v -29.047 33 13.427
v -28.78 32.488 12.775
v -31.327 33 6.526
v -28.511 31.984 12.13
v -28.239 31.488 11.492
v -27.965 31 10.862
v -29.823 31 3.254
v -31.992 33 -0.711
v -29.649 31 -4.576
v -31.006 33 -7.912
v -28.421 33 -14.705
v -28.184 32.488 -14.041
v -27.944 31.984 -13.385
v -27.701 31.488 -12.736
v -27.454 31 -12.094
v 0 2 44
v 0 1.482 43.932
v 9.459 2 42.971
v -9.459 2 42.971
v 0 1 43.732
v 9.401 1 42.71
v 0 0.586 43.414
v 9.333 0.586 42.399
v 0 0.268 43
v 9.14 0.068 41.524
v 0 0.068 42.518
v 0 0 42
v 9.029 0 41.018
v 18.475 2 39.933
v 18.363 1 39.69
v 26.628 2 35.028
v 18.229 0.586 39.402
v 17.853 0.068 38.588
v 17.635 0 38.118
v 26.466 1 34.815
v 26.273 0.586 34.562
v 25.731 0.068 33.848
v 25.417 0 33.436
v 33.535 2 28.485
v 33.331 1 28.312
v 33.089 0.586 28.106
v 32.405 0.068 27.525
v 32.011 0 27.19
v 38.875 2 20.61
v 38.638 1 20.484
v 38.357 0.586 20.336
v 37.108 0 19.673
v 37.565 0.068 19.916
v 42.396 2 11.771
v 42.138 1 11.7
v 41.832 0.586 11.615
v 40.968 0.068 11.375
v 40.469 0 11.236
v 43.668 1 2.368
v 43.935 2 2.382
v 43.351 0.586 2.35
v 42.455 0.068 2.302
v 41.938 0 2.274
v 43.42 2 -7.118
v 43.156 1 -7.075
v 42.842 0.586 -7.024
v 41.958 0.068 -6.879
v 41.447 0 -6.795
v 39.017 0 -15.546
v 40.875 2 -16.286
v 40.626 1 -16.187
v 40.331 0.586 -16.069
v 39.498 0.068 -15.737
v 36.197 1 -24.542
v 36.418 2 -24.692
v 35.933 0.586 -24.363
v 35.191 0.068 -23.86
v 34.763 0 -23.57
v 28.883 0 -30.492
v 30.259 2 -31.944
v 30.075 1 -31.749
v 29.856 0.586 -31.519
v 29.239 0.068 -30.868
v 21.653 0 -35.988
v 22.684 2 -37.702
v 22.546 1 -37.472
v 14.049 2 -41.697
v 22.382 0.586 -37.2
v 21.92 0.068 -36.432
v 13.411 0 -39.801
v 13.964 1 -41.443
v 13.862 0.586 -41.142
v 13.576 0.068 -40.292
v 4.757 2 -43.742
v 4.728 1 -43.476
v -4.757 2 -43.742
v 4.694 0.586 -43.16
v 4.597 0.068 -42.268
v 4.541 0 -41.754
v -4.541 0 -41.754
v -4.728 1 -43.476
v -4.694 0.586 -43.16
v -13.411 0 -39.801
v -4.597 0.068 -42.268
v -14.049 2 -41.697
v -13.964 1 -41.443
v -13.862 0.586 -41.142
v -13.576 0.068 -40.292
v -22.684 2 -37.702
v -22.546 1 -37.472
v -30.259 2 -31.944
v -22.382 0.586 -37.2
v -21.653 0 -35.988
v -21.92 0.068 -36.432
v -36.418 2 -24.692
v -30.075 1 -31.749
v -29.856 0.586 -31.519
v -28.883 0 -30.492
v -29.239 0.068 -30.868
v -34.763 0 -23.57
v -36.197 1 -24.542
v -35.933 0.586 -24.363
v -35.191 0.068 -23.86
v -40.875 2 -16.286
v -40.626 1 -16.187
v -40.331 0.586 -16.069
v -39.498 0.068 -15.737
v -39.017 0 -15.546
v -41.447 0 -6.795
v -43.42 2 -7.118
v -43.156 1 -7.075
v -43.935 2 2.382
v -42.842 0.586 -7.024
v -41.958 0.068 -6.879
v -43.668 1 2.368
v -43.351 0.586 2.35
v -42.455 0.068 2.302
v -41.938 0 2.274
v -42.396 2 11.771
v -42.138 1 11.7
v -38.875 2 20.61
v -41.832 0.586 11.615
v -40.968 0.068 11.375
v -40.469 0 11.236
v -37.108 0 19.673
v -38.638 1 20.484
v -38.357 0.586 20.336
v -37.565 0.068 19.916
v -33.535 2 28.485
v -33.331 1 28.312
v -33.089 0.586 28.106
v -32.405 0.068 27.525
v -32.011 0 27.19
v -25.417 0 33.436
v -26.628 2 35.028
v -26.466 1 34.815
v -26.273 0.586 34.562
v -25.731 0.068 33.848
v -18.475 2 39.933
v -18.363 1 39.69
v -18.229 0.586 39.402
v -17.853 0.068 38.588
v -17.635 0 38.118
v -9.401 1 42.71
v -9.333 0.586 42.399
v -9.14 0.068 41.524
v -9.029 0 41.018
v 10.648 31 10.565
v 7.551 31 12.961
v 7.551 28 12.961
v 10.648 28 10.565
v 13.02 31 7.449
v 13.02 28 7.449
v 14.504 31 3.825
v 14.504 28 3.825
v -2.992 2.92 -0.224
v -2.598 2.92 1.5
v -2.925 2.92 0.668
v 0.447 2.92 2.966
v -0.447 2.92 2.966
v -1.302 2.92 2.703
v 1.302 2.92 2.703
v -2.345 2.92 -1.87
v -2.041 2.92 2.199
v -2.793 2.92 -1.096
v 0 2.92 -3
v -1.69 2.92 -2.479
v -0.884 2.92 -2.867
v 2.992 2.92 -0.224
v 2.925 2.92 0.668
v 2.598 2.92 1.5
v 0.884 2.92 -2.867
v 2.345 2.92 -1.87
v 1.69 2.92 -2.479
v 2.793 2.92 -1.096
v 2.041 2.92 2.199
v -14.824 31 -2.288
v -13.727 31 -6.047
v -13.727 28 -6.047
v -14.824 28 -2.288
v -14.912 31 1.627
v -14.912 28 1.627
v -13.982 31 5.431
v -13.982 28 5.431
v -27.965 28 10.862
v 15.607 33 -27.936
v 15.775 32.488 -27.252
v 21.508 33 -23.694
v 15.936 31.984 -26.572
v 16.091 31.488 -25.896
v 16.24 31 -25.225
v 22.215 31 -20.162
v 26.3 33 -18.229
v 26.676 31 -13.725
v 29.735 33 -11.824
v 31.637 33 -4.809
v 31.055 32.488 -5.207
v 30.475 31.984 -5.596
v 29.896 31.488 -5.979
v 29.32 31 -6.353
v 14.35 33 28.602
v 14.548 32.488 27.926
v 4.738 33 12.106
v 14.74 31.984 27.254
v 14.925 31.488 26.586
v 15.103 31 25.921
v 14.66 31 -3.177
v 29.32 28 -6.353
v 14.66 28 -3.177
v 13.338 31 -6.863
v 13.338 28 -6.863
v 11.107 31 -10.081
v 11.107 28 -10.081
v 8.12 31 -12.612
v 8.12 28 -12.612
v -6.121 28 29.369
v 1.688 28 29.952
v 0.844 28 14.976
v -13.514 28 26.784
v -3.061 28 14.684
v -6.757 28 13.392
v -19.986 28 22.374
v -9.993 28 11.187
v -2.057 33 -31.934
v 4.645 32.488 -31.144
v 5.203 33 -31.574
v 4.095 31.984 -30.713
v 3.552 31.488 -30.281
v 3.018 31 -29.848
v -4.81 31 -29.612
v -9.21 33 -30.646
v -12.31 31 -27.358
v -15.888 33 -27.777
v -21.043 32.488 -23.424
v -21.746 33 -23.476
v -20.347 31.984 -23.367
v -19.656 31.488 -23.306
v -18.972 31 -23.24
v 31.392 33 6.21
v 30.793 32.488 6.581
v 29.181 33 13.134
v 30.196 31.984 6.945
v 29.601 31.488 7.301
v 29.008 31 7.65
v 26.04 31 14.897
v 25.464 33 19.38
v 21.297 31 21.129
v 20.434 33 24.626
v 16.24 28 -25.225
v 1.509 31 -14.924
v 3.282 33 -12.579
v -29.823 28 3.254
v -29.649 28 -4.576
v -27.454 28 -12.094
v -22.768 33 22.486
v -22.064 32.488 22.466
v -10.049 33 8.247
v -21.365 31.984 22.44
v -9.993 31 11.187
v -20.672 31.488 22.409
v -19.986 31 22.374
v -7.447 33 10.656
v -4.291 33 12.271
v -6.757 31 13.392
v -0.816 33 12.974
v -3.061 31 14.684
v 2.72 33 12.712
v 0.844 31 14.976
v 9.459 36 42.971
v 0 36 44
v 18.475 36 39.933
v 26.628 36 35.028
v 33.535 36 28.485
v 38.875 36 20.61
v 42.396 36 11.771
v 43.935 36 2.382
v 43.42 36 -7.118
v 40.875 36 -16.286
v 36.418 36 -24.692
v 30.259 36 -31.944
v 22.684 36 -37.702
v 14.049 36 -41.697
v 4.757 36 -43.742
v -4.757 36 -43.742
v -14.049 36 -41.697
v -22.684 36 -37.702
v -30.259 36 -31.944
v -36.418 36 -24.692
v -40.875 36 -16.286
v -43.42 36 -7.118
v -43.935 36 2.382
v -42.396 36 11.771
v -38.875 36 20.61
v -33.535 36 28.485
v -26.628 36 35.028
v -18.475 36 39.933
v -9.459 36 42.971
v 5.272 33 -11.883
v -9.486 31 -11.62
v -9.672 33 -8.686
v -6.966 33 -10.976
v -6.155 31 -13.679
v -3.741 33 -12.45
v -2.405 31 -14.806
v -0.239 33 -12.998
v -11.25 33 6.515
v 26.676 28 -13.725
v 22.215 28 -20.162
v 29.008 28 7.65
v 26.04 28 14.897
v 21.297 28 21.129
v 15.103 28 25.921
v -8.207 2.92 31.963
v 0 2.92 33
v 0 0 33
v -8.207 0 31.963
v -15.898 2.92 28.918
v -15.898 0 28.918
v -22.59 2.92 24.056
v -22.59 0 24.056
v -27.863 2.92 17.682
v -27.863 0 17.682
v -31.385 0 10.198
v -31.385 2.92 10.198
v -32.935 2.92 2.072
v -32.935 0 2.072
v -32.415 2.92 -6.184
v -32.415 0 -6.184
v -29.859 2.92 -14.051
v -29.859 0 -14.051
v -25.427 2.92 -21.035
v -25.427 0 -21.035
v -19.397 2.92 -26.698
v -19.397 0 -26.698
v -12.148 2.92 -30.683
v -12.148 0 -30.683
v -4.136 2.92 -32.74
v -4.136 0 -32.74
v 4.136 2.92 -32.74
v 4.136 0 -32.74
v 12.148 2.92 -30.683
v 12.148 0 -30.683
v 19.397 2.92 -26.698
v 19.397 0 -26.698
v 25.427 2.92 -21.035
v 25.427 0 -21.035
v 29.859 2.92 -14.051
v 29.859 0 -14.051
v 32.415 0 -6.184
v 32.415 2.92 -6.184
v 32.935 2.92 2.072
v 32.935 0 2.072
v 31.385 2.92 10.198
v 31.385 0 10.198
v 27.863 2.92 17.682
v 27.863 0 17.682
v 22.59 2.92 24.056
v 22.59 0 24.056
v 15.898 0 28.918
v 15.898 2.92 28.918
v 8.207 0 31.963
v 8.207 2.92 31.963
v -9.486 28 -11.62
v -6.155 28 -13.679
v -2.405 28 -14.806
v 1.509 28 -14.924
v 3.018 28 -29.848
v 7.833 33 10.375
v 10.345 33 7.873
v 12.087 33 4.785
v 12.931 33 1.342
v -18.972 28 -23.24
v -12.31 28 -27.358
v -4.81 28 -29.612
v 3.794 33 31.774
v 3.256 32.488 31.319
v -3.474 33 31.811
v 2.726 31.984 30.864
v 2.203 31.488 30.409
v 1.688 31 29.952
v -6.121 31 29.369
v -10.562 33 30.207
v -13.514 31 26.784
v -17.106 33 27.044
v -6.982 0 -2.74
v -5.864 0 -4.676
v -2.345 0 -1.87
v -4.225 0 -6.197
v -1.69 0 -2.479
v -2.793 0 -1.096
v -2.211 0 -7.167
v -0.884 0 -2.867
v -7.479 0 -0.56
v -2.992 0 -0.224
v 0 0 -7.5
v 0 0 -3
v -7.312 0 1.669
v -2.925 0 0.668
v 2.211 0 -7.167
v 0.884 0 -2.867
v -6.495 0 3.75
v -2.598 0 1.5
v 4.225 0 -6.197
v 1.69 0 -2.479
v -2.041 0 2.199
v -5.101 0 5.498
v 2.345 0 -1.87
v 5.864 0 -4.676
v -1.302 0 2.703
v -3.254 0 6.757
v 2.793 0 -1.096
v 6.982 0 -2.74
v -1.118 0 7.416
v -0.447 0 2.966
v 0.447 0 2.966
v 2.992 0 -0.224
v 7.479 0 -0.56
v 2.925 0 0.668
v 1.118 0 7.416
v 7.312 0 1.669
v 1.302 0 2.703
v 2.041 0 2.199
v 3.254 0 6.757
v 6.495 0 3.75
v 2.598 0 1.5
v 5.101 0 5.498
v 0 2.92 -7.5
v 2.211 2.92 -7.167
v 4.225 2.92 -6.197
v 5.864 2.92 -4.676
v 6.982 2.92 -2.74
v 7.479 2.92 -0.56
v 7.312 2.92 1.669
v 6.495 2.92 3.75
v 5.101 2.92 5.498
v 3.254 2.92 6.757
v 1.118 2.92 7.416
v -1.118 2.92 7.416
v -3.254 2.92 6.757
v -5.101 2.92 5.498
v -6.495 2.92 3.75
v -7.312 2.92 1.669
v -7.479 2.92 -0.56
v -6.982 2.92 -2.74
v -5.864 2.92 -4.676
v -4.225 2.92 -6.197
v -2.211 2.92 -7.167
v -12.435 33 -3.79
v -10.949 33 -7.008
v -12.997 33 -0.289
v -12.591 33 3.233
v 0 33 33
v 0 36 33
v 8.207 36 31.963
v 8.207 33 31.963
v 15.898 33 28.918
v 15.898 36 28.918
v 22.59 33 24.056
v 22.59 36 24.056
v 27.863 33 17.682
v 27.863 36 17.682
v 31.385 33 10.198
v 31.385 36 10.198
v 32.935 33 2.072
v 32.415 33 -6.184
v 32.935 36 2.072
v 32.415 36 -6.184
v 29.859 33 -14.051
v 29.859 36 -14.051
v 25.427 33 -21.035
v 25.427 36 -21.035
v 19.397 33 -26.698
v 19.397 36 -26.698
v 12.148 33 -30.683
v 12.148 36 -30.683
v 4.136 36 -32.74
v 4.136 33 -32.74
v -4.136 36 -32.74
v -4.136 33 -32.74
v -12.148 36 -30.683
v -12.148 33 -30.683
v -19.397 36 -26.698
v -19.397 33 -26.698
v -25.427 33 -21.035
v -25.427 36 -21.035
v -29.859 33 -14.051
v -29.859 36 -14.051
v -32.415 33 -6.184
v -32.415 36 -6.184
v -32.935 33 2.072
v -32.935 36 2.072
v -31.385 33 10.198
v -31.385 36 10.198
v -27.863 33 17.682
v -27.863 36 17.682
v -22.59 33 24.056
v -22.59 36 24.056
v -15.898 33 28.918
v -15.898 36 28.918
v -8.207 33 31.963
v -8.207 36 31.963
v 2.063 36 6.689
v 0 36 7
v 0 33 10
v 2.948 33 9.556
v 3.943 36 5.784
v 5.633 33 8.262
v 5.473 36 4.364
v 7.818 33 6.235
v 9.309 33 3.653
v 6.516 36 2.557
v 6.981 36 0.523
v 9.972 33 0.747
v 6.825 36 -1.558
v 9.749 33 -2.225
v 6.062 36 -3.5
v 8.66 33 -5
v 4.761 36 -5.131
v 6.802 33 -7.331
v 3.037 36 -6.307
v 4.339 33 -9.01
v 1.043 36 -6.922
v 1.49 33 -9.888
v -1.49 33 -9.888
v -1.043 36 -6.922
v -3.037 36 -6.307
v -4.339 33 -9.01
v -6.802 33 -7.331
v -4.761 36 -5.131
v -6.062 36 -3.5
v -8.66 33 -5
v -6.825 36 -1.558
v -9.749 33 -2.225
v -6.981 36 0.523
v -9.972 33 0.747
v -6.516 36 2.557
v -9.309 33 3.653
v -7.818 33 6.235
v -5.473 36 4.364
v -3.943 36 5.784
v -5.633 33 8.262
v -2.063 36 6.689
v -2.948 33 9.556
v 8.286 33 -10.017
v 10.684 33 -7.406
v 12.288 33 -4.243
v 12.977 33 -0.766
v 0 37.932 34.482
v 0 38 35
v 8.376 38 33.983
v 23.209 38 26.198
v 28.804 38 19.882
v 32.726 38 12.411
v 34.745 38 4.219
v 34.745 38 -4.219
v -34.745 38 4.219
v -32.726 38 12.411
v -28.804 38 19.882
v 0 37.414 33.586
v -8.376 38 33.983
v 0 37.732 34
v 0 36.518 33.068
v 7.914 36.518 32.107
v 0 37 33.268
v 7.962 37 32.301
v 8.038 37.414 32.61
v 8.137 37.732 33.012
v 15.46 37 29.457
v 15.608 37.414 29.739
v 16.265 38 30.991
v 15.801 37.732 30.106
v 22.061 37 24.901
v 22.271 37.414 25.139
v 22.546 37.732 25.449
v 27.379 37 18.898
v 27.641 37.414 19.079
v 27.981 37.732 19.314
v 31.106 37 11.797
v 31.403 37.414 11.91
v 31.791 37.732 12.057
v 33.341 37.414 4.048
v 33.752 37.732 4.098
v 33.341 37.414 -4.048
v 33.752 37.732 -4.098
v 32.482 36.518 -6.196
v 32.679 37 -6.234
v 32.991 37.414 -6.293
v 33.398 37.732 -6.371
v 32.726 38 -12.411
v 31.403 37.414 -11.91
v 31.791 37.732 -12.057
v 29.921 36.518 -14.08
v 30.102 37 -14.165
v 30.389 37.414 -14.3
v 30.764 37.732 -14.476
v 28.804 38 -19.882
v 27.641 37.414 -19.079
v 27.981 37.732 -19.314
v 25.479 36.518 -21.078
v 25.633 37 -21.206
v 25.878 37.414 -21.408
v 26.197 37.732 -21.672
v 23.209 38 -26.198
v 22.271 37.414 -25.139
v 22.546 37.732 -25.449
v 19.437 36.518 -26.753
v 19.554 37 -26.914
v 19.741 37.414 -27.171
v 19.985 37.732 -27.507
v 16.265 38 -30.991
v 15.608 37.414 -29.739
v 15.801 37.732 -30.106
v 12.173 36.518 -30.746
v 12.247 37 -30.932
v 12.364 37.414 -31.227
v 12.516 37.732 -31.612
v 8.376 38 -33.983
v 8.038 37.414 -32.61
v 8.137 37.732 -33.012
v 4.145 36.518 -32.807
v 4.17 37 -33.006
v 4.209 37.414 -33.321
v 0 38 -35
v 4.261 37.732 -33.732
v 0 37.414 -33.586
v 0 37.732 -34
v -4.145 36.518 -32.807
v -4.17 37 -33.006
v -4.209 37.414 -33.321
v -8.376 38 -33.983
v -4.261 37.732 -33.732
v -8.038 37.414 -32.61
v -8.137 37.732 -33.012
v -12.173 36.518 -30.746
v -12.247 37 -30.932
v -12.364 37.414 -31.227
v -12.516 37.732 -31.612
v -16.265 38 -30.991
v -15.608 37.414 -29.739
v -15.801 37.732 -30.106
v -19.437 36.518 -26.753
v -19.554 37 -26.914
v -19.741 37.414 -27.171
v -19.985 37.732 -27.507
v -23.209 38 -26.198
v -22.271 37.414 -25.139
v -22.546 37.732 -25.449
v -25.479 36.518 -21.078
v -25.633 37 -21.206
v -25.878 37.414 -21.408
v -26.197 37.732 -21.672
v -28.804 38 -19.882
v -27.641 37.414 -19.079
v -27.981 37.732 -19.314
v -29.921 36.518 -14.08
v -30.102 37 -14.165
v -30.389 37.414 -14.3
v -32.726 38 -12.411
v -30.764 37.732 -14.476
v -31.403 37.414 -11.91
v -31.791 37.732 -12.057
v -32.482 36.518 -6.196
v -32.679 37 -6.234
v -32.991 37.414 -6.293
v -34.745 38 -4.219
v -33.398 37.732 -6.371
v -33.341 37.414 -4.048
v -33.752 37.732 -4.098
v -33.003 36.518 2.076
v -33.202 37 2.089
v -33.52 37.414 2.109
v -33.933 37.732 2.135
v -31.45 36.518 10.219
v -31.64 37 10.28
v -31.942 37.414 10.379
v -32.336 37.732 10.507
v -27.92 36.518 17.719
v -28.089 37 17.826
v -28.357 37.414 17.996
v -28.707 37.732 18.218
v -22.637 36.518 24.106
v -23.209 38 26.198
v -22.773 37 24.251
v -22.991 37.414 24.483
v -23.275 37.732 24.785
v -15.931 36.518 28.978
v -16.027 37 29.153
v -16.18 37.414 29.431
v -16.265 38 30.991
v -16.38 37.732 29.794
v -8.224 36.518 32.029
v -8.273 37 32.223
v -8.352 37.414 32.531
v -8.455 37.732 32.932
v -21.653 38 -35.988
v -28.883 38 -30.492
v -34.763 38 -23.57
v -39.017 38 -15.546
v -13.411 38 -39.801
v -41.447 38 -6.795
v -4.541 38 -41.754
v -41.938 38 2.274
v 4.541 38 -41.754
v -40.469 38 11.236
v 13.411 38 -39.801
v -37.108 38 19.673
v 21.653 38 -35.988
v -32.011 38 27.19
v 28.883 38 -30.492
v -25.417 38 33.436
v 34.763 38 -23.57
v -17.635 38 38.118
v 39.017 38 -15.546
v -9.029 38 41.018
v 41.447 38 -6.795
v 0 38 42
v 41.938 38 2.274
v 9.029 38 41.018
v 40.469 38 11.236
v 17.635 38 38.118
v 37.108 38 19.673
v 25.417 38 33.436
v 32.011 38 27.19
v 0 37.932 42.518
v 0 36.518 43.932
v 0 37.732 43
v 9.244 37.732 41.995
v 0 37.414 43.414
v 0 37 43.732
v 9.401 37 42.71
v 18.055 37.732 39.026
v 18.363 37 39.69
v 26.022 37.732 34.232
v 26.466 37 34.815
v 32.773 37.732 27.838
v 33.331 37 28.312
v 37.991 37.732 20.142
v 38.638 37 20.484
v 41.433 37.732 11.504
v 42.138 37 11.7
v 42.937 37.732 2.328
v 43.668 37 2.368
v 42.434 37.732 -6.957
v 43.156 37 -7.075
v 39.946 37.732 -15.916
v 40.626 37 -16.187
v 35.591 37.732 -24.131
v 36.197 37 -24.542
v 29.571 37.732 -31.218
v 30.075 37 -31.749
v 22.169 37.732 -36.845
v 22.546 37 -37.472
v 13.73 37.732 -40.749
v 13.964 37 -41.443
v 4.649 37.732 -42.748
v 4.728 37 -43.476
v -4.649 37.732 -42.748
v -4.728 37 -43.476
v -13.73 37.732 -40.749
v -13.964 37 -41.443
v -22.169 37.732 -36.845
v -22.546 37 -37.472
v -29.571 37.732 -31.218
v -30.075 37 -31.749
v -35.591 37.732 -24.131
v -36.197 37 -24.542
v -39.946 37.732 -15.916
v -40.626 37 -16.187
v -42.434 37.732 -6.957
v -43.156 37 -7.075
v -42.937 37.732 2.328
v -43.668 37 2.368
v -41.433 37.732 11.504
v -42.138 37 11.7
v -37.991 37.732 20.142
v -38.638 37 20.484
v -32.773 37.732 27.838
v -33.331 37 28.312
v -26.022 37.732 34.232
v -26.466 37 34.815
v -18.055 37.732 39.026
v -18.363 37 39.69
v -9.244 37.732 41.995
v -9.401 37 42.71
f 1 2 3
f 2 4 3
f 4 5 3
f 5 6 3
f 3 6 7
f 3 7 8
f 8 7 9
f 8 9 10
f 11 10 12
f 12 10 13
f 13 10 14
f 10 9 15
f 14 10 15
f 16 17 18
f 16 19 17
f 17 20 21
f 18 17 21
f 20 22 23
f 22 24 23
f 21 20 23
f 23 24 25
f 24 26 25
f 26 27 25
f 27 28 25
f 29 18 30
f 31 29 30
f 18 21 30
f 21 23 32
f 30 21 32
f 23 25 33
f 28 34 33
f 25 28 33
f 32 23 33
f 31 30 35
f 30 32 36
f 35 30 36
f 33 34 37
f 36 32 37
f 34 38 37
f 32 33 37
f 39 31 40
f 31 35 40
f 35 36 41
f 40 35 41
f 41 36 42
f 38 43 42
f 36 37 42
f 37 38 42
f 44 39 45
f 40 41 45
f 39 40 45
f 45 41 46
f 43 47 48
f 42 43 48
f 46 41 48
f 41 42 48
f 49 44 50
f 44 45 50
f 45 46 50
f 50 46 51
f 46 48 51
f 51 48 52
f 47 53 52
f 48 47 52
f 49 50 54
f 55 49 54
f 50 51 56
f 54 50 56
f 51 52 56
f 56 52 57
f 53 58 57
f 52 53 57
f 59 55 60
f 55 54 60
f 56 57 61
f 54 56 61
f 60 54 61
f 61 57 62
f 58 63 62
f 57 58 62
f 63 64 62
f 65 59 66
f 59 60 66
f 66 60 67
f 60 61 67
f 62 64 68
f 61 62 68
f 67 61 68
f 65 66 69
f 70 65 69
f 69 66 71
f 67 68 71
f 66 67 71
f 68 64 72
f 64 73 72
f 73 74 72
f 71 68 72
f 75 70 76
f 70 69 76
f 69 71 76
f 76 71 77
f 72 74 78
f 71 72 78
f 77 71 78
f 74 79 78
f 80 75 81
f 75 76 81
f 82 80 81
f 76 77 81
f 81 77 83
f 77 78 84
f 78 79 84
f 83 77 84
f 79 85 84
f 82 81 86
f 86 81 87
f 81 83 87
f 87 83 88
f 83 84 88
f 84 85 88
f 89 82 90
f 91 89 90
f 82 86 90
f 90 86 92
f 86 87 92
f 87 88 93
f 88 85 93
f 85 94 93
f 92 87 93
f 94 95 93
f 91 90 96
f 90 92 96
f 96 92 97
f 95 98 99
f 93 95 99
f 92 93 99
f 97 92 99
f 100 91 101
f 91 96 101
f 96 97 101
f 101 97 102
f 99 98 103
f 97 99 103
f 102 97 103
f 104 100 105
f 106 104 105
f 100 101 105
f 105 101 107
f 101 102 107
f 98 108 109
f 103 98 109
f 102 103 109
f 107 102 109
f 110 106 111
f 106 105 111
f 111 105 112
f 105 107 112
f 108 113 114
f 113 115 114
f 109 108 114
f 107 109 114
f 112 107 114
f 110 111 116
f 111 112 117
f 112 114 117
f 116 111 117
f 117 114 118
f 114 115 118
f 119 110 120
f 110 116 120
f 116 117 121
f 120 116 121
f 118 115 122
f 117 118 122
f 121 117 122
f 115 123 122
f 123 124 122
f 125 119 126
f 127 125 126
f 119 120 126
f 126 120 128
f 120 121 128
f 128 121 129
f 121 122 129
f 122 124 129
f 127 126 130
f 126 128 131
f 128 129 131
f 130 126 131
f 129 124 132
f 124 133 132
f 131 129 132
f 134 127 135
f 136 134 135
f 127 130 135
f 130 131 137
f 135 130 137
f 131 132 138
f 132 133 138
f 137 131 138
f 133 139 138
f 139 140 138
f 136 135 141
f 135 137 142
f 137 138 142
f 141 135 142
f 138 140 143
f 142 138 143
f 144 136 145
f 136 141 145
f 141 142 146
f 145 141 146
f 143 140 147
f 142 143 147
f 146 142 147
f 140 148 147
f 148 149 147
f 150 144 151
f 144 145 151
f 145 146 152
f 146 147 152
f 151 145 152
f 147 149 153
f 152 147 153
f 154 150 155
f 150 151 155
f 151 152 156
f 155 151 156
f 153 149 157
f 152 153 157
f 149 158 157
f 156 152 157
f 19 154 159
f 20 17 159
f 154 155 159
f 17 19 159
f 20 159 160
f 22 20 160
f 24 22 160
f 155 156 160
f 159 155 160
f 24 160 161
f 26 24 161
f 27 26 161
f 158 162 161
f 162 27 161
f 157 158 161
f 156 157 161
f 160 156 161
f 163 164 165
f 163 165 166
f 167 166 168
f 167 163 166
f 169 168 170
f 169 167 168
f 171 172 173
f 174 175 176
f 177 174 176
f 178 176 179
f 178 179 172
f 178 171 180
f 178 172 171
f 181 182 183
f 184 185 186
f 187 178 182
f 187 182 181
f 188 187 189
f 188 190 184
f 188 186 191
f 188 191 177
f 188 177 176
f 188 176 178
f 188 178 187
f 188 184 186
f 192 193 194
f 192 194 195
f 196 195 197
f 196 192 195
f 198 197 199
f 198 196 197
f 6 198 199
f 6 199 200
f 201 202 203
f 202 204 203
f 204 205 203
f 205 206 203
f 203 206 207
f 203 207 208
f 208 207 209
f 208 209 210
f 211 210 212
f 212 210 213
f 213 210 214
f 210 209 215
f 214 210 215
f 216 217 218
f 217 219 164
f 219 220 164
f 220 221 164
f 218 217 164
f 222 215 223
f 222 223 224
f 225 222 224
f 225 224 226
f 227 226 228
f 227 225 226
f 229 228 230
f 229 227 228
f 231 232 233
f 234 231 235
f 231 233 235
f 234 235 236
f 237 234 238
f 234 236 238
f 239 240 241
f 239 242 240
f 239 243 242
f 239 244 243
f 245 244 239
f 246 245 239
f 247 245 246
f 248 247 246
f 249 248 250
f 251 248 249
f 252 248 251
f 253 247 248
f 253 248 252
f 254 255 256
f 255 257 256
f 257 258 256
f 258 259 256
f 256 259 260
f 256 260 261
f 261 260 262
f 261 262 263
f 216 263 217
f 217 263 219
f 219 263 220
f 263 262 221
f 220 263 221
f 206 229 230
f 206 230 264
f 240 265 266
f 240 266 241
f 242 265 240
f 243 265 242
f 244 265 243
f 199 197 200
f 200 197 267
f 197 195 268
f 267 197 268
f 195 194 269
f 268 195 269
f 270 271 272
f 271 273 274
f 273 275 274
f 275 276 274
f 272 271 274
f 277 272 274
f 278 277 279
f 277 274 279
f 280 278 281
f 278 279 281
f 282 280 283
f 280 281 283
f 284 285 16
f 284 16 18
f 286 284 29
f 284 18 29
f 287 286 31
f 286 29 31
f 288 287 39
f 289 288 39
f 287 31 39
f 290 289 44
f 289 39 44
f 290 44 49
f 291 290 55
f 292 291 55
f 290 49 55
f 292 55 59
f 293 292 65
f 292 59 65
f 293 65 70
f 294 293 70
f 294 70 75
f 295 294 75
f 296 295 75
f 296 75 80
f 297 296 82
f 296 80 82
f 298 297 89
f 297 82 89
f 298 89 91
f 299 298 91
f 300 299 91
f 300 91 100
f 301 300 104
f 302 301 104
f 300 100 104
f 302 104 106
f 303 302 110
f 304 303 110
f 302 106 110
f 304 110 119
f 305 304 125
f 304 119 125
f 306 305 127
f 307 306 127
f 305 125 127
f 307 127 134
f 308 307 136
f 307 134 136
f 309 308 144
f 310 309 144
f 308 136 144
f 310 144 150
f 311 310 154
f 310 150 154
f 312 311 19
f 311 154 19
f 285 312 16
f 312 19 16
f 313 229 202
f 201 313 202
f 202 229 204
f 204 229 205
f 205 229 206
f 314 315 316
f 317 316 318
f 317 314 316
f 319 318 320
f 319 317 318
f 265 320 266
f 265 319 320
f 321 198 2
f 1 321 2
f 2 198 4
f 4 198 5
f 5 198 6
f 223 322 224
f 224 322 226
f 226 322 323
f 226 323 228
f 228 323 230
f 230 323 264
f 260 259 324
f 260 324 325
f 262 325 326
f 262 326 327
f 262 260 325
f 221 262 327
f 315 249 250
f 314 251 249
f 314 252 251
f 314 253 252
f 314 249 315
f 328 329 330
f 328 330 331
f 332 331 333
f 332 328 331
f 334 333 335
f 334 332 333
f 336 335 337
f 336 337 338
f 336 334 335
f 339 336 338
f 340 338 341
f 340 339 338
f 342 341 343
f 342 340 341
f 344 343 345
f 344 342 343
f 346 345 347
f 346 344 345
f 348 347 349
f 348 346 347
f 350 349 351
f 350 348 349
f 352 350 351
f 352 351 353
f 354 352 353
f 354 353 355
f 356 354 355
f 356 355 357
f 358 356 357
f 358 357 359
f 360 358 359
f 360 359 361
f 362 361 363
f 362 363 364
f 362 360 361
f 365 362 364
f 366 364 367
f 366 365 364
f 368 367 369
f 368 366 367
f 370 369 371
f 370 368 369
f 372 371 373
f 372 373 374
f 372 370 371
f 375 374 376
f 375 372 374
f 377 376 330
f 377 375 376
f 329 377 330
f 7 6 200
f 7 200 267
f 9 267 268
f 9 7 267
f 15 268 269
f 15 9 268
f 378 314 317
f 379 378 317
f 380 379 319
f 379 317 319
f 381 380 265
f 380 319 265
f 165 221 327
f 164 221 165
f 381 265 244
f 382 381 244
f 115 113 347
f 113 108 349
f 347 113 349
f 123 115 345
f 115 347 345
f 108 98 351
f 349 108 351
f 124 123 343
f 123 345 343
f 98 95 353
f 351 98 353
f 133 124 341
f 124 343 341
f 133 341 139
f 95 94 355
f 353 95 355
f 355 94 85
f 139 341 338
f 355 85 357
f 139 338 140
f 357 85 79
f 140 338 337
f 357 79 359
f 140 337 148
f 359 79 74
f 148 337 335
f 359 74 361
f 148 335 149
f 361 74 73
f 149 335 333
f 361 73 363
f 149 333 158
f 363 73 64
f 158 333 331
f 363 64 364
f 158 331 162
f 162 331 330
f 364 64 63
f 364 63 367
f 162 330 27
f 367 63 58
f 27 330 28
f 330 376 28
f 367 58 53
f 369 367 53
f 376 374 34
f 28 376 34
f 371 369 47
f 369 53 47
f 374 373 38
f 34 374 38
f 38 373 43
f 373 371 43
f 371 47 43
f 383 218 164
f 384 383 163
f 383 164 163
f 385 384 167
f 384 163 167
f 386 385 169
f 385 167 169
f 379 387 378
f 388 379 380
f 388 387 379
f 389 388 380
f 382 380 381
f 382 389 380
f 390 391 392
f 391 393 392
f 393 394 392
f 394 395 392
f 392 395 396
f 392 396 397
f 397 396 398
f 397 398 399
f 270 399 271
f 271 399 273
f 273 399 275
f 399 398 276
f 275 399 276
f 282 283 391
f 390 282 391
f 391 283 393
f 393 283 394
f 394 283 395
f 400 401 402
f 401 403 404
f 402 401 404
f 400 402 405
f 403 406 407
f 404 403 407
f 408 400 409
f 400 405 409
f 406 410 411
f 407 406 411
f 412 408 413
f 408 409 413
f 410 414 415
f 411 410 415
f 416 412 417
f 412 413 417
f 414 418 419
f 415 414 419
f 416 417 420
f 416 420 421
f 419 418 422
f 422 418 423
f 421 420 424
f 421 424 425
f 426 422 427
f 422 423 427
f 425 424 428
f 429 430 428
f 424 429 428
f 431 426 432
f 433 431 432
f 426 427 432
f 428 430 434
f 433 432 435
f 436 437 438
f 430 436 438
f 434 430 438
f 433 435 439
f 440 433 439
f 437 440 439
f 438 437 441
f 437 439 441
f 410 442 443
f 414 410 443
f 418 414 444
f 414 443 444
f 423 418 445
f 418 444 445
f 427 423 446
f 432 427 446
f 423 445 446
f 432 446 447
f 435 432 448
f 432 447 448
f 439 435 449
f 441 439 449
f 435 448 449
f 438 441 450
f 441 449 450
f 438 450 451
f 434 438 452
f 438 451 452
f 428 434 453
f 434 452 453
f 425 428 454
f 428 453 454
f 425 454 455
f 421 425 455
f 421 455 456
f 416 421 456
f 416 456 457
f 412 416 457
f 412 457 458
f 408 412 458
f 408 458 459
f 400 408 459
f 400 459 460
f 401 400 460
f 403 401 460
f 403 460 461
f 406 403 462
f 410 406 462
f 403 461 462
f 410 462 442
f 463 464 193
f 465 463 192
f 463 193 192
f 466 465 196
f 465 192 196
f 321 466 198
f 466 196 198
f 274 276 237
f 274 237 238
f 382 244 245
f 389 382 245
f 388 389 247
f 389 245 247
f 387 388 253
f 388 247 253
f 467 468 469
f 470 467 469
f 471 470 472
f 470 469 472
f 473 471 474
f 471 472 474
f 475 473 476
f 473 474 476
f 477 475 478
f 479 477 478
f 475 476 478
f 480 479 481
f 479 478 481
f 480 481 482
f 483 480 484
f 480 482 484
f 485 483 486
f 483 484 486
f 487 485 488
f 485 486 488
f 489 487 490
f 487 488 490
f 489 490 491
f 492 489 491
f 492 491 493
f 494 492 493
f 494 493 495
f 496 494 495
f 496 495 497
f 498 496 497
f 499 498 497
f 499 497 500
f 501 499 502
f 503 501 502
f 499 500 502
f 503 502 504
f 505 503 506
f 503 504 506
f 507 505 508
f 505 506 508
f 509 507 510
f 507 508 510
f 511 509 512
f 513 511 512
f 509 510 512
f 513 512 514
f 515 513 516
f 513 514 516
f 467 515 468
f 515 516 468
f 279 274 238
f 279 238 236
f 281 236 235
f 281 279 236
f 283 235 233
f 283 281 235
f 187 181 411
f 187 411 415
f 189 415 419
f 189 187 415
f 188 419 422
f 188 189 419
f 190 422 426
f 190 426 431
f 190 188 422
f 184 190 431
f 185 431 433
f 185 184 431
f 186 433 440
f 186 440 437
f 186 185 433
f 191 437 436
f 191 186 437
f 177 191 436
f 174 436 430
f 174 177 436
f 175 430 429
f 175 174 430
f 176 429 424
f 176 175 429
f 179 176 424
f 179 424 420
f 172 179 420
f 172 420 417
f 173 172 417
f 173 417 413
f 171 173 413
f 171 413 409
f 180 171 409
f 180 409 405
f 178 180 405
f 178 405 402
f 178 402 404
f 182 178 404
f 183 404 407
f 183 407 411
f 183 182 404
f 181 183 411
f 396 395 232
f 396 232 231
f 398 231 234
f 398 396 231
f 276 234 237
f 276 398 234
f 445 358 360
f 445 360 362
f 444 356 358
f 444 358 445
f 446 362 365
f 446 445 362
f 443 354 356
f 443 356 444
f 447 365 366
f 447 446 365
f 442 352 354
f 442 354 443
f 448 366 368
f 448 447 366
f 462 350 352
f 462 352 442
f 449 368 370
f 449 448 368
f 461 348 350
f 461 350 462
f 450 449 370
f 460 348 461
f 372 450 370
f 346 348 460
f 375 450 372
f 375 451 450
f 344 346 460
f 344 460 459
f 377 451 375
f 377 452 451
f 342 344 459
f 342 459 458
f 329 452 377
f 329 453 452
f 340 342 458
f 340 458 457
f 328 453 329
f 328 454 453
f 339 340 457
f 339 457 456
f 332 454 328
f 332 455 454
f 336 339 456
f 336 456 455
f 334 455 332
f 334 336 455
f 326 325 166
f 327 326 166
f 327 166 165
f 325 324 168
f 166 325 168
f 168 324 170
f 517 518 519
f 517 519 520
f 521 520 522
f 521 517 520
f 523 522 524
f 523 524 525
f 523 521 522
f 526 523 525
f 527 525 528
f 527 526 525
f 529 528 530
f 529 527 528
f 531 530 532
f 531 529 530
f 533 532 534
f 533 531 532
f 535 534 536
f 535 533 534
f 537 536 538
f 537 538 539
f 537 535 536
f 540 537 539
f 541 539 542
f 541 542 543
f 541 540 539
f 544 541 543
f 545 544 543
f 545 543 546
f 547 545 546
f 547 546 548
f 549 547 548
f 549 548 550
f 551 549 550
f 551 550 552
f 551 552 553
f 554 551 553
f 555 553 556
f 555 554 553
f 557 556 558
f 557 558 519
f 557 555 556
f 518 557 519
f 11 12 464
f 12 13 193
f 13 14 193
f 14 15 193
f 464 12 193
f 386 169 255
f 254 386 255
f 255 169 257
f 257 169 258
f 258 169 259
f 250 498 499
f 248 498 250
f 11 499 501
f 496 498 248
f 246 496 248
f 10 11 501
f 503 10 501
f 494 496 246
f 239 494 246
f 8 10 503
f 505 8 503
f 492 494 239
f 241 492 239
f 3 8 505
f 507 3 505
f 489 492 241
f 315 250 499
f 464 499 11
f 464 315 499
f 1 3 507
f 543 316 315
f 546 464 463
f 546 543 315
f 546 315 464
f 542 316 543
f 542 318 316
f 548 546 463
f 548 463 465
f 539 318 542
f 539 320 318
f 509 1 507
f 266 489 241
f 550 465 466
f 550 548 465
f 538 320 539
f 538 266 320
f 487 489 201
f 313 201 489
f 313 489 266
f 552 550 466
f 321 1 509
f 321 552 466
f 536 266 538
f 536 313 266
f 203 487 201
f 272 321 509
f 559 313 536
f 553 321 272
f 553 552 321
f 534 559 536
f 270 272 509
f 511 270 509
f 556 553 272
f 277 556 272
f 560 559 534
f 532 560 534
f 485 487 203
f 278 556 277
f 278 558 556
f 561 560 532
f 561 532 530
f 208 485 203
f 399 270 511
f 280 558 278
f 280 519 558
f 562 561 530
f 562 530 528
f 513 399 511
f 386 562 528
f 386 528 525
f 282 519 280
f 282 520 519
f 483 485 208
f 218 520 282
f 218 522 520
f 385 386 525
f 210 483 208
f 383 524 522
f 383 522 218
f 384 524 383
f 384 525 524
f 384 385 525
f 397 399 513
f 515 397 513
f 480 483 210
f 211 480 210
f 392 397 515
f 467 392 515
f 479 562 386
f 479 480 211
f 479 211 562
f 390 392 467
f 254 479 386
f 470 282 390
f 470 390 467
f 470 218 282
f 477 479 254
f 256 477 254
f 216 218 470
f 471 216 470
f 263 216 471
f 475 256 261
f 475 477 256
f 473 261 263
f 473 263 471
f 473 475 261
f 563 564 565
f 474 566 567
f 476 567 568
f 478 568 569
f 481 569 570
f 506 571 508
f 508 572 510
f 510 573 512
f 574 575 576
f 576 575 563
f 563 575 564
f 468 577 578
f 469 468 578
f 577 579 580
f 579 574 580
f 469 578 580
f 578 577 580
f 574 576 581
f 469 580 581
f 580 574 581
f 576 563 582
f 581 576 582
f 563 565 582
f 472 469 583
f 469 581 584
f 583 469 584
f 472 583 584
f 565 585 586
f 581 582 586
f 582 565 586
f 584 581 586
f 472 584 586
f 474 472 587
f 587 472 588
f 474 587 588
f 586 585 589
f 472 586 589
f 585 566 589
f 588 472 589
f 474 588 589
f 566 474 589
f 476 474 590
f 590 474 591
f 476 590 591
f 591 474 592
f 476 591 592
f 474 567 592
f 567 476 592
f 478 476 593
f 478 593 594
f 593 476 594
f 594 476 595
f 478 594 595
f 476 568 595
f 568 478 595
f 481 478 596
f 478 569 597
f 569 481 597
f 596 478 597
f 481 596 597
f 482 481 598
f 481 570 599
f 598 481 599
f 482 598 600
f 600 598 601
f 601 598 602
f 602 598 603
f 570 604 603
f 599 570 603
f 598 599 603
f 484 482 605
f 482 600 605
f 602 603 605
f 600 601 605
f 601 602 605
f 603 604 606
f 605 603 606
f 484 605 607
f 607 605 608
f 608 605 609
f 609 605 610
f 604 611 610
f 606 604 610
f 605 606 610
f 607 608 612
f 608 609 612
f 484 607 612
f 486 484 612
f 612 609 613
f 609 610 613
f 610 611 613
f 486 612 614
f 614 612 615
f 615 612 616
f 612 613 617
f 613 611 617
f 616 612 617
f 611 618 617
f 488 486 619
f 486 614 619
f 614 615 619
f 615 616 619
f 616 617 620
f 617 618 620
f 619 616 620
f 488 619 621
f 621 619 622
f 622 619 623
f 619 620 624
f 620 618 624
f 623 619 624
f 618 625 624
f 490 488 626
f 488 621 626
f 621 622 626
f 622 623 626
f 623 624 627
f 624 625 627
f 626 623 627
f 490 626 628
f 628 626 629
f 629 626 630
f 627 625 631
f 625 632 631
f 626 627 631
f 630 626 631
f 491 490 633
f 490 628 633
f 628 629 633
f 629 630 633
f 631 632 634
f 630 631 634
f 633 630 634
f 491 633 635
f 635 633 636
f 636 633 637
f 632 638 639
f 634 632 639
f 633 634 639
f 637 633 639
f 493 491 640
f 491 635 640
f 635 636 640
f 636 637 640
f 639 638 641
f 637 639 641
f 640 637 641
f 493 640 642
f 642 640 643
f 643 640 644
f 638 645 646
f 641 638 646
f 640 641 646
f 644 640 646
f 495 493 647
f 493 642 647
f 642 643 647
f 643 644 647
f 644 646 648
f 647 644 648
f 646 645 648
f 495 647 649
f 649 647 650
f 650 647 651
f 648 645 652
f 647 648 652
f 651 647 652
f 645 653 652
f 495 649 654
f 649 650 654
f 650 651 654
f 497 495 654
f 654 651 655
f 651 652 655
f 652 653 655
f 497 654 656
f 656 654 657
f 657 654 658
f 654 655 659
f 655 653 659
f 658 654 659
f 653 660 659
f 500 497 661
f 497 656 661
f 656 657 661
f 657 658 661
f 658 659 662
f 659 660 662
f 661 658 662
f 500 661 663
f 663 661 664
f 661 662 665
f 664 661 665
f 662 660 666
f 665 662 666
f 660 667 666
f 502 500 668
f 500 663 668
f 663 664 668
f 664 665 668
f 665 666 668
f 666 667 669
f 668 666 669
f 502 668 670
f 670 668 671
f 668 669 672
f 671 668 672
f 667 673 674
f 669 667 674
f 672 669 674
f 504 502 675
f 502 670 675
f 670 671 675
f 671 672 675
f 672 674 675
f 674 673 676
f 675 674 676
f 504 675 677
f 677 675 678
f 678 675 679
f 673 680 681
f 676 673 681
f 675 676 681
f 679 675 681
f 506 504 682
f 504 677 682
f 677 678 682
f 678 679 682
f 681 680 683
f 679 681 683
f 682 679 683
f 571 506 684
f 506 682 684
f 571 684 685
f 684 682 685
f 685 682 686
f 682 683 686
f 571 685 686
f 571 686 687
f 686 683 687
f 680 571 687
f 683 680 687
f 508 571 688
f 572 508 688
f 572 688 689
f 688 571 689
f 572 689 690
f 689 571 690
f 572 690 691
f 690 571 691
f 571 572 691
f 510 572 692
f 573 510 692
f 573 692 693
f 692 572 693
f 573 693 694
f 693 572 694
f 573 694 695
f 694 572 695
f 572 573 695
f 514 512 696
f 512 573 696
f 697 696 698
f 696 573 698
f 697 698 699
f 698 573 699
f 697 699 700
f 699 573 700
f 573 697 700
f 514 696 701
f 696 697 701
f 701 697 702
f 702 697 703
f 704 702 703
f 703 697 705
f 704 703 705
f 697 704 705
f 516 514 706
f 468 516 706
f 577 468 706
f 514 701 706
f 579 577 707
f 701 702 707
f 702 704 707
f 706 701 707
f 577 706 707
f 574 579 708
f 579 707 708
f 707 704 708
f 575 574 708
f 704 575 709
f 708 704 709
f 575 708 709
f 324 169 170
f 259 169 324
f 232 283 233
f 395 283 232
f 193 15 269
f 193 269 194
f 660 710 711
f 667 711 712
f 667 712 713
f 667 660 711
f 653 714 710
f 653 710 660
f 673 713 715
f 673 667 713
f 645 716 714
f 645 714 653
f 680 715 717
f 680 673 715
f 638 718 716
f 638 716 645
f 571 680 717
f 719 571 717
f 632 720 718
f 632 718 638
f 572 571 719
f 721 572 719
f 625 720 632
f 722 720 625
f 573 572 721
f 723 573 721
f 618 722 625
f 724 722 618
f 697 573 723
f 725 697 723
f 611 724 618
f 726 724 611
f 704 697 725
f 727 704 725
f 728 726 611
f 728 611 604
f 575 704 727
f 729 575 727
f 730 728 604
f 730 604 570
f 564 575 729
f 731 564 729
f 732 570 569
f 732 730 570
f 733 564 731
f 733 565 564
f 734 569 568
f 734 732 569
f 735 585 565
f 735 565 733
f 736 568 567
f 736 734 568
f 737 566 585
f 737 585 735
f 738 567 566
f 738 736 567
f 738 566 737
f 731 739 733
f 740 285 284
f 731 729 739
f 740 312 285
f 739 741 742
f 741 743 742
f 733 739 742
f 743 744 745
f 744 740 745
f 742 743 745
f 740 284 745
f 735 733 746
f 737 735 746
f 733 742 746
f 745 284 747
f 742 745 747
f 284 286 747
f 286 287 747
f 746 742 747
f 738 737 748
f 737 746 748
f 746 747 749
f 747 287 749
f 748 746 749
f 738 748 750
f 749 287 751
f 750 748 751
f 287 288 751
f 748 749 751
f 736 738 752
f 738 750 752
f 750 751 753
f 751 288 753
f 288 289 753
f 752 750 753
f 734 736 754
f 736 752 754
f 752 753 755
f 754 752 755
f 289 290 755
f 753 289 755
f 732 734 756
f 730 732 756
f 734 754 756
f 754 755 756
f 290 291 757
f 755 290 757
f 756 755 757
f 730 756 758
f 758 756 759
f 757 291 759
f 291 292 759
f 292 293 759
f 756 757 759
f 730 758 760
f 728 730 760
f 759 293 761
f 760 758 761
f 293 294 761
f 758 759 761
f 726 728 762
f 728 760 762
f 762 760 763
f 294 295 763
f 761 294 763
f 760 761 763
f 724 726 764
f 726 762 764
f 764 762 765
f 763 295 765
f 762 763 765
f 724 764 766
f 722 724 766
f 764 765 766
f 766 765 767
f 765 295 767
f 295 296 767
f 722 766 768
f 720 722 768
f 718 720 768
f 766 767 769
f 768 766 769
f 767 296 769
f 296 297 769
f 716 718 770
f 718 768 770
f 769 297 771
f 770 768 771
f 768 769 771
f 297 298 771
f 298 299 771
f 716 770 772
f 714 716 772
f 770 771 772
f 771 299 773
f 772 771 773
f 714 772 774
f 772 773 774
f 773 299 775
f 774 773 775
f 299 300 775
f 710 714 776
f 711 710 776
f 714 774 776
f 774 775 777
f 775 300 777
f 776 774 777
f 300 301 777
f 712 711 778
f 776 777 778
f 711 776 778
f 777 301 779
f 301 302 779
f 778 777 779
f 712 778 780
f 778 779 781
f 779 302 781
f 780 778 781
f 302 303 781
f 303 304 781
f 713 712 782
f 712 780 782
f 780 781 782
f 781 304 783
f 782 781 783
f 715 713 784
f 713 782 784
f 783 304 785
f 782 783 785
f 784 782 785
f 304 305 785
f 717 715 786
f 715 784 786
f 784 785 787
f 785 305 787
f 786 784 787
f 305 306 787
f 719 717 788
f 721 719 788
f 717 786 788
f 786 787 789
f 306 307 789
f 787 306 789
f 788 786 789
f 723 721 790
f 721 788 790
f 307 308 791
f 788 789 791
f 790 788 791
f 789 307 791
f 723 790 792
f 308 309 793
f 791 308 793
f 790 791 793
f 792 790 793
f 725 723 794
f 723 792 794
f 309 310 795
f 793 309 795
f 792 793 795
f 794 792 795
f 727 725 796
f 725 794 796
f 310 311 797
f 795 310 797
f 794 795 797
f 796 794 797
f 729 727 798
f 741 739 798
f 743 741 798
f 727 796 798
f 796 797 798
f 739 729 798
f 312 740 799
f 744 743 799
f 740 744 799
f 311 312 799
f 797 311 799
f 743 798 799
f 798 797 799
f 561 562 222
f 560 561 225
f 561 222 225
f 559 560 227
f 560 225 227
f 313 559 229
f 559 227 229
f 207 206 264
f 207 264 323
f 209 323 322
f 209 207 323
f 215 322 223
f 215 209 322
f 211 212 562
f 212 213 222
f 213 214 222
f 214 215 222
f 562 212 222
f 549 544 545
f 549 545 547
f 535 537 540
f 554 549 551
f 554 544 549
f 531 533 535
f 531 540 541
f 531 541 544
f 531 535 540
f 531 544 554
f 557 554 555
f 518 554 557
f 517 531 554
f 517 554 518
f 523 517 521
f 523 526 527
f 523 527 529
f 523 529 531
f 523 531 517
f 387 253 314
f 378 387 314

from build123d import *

# Parameters (mm, degrees)
SKETCH_1_R          = 44
EXTRUDE_1_DEPTH     = 38
SKETCH_3_R          = 33
CUT_EXTRUDE_1_DEPTH = 5
CUT_EXTRUDE_2_DEPTH = 5
SKETCH_5_R          = 10
EXTRUDE_2_DEPTH     = 3
CHAMFER_1_SIZE      = 3
CHAMFER_2_SIZE      = 2
FILLET_1_R          = 2
CUT_EXTRUDE_START   = -2.92
SKETCH_6_R          = 33
SKETCH_6_R_2        = 7.5
SKETCH_6_R_3        = 3
CUT_EXTRUDE_3_DEPTH = 2.92


with BuildPart() as part:
    # 草图1 → 凸台-拉伸1 (new body)
    with BuildSketch(Plane(origin=(0, 0, 0), x_dir=(1, 0, 0), z_dir=(0, 1, 0))):
        with Locations(Location((0, 0, 0), (0, 0, 270))):
            Circle(SKETCH_1_R)
    extrude(amount=EXTRUDE_1_DEPTH)

    # 草图3 → 切除-拉伸1 (cut)
    with BuildSketch(Plane(origin=(0, 38, 0), x_dir=(1, 0, 0), z_dir=(0, 1, 0))):
        with Locations(Location((0, 0, 0), (0, 0, 270))):
            Circle(SKETCH_3_R)
    extrude(amount=-CUT_EXTRUDE_1_DEPTH, mode=Mode.SUBTRACT)

    # 草图4 → 切除-拉伸2 (cut)
    with BuildSketch(Plane(origin=(0, 33, 0), x_dir=(1, 0, 0), z_dir=(0, 1, 0))):
        with BuildLine():
            Line((-18.971630185, 23.239562132), (-9.485815093, 11.619781066))
            ThreePointArc((-9.485815093, 11.619781066), (-4.317052712, 14.365342178), (1.508941811, 14.923910165))
            Line((1.508941811, 14.923910165), (3.017883621, 29.84782033))
            ThreePointArc((3.017883621, 29.84782033), (-8.634105423, 28.730684356), (-18.971630185, 23.239562132))
        make_face()
        with BuildLine():
            Line((29.319541348, 6.353305844), (14.659770674, 3.176652922))
            ThreePointArc((14.659770674, 3.176652922), (12.328209633, 8.544895976), (8.119790432, 12.612256077))
            Line((8.119790432, 12.612256077), (16.239580864, 25.224512153))
            ThreePointArc((16.239580864, 25.224512153), (24.656419267, 17.089791951), (29.319541348, 6.353305844))
        make_face()
        with BuildLine():
            Line((15.102589466, -25.921261378), (7.551294733, -12.960630689))
            ThreePointArc((7.551294733, -12.960630689), (11.936305286, -9.084306035), (14.504121561, -3.824978136))
            Line((14.504121561, -3.824978136), (29.008243122, -7.649956272))
            ThreePointArc((29.008243122, -7.649956272), (23.872610571, -18.168612069), (15.102589466, -25.921261378))
        make_face()
        with BuildLine():
            Line((-19.98562774, -22.373526406), (-9.99281387, -11.186763203))
            ThreePointArc((-9.99281387, -11.186763203), (-4.951167267, -14.159305869), (0.84424967, -14.976222571))
            Line((0.84424967, -14.976222571), (1.68849934, -29.952445142))
            ThreePointArc((1.68849934, -29.952445142), (-9.902334534, -28.318611738), (-19.98562774, -22.373526406))
        make_face()
        with BuildLine():
            Line((-27.454386696, 12.09366161), (-13.727193348, 6.046830805))
            ThreePointArc((-13.727193348, 6.046830805), (-14.996294941, 0.33337375), (-13.98234657, -5.430836436))
            Line((-13.98234657, -5.430836436), (-27.96469314, -10.861672872))
            ThreePointArc((-27.96469314, -10.861672872), (-29.992589881, 0.666747501), (-27.454386696, 12.09366161))
        make_face()
    extrude(amount=-CUT_EXTRUDE_2_DEPTH, mode=Mode.SUBTRACT)

    # 草图5 → 凸台-拉伸2 (add)
    with BuildSketch(Plane(origin=(0, 33, 0), x_dir=(1, 0, 0), z_dir=(0, 1, 0))):
        with Locations(Location((0, 0, 0), (0, 0, 270))):
            Circle(SKETCH_5_R)
    extrude(amount=EXTRUDE_2_DEPTH)

    # 倒角1
    chamfer_1_edges = [part.edges().sort_by_distance(p)[0] for p in [
        (0, 36, -10),
    ]]
    chamfer(chamfer_1_edges, length=CHAMFER_1_SIZE - 0.0001)  # a hair under: the kernel refuses the full size

    # 倒角2
    chamfer_2_edges = [part.edges().sort_by_distance(p)[0] for p in [
        (-14.996294941, 33, -0.33337375),
        (-20.590790022, 33, -9.070246208),
        (-29.992589881, 33, -0.666747501),
        (-20.973519855, 33, 8.146254654),
        (-4.951167267, 33, 14.159305869),
        (-14.989220805, 33, 16.780144805),
        (-9.902334534, 33, 28.318611738),
        (1.266374505, 33, 22.464333856),
        (11.936305286, 33, 9.084306035),
        (11.3269421, 33, 19.440946033),
        (23.872610571, 33, 18.168612069),
        (21.756182342, 33, 5.737467204),
        (12.328209633, 33, -8.544895976),
        (21.989656011, 33, -4.764979383),
        (24.656419267, 33, -17.089791951),
        (12.179685648, 33, -18.918384115),
        (-4.317052712, 33, -14.365342178),
        (2.263412716, 33, -22.385865247),
        (-8.634105423, 33, -28.730684356),
        (-14.228722639, 33, -17.429671599),
    ]]
    chamfer(chamfer_2_edges, length=CHAMFER_2_SIZE)

    # 圆角1
    fillet_1_edges = [part.edges().sort_by_distance(p)[0] for p in [
        (0, 0, -44),
        (0, 38, -44),
        (0, 38, -33),
    ]]
    fillet(fillet_1_edges, radius=FILLET_1_R)

    # 草图6 → 切除-拉伸3 (cut)
    # profile 1 of 2: a face of its own
    with BuildSketch(Plane.XZ.offset(CUT_EXTRUDE_START)):
        with Locations(Location((0, 0, 0), (0, 0, 90))):
            Circle(SKETCH_6_R)
        with Locations(Location((0, 0, 0), (0, 0, 270))):
            Circle(SKETCH_6_R_2, mode=Mode.SUBTRACT)
    # profile 2 of 2: a face of its own
    with BuildSketch(Plane.XZ.offset(CUT_EXTRUDE_START)):
        with Locations(Location((0, 0, 0), (0, 0, 270))):
            Circle(SKETCH_6_R_3)
    extrude(amount=CUT_EXTRUDE_3_DEPTH, mode=Mode.SUBTRACT)


solid = part.part
